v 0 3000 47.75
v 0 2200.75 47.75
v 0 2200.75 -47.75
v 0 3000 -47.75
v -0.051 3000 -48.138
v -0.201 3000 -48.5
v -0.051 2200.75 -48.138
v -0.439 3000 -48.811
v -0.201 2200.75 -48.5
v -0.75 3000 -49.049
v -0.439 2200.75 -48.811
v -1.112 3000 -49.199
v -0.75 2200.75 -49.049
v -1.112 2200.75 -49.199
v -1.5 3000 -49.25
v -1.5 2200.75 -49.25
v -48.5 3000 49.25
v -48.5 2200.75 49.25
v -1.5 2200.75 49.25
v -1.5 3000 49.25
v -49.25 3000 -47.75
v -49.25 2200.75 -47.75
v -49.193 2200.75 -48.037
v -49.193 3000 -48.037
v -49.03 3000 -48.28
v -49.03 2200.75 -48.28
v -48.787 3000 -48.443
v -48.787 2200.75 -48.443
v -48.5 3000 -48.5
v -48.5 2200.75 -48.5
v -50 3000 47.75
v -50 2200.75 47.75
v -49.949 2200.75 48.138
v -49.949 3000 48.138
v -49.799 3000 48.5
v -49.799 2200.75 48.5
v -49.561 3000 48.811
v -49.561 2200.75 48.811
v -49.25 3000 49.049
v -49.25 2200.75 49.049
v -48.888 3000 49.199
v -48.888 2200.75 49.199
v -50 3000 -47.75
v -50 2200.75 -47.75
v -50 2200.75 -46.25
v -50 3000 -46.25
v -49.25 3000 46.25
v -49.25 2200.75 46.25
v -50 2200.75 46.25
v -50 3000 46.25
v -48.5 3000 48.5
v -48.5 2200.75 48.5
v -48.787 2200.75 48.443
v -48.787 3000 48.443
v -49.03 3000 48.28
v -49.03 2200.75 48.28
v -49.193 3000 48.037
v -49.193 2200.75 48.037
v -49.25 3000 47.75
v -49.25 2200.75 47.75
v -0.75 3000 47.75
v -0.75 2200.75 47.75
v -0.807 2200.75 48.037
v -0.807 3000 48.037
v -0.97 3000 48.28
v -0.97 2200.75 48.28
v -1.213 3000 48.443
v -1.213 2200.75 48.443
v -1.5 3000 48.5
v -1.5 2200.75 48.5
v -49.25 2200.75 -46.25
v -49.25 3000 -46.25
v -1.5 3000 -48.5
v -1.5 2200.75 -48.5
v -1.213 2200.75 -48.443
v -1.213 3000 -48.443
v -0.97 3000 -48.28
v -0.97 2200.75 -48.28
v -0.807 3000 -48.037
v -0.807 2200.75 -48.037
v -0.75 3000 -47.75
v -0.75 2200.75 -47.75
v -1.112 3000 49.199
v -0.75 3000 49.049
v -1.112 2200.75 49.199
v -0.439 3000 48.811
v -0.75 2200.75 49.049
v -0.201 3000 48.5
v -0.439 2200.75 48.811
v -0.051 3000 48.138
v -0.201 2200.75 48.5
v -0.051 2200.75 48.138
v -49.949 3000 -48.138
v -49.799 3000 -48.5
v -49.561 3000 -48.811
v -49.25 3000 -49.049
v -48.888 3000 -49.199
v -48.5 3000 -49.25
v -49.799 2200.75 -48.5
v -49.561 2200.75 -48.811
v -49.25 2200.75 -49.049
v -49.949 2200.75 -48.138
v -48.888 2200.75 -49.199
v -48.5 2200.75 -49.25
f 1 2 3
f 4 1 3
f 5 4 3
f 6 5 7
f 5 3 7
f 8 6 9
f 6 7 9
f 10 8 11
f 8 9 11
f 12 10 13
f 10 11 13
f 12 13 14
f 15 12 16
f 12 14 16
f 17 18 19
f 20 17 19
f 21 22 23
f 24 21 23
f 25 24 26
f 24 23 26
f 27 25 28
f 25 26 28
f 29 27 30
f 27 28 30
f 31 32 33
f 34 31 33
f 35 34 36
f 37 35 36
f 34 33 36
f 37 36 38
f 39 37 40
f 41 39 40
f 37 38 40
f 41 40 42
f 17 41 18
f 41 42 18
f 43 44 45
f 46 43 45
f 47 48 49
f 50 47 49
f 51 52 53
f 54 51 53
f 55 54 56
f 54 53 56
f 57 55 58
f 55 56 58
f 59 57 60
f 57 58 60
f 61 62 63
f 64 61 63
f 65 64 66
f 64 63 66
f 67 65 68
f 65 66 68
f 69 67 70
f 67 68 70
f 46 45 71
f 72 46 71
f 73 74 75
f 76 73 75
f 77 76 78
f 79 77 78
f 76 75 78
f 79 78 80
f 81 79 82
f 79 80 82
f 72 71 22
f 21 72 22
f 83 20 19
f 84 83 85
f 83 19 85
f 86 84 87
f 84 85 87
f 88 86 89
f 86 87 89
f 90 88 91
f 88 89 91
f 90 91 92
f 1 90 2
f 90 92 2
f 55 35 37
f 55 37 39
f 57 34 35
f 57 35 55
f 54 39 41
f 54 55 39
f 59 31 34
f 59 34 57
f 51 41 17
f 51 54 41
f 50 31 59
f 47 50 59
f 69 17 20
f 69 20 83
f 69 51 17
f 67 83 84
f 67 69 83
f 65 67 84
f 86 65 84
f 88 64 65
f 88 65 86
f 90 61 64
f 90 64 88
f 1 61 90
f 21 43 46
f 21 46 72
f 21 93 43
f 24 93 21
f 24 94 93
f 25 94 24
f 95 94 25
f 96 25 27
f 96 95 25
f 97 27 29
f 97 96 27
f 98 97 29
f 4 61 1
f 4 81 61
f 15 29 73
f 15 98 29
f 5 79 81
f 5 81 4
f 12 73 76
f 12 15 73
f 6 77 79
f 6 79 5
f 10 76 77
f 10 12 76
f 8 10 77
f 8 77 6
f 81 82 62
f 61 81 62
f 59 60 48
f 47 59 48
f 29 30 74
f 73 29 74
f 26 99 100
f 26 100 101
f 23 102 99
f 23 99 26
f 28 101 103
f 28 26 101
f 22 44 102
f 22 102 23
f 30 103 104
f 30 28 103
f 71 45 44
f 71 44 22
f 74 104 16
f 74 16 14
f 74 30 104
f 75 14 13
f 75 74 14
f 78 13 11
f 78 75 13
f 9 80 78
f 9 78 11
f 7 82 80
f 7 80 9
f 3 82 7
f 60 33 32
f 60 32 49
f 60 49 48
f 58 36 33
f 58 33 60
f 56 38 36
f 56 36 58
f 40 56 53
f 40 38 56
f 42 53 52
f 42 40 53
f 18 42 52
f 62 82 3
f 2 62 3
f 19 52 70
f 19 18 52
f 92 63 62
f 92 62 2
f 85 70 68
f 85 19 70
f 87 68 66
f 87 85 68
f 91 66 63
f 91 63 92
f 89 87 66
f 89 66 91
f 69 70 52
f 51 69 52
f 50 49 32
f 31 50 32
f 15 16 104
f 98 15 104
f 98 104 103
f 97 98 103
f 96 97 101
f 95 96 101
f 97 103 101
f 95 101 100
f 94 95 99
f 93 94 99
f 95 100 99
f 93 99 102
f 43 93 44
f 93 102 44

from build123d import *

# Parameters (mm, degrees)
MOVE_BODY_2_DEPTH    = 3000
SKETCH_6_OUTSIDE_W   = 652.406
SKETCH_6_OUTSIDE_H   = 3602.406
SKETCH_6_OUTSIDE_W_2 = 50
SKETCH_6_OUTSIDE_H_2 = 799.25
CUT_EXTRUDE_1_DEPTH  = 3003.033019472


# Read off the part's stored shape, not the designer's step: Тело-Переместить/Копировать2
with BuildPart() as part:
    # Move Body 2 outline → Move Body 2 (new body)
    with BuildSketch(Plane(origin=(0, 0, 0), x_dir=(1, 0, 0), z_dir=(0, 1, 0))):
        with BuildLine():
            Line((-50, 47.75), (-50, 46.25))
            Line((-50, 46.25), (-49.25, 46.25))
            Line((-49.25, 46.25), (-49.25, 47.75))
            ThreePointArc((-49.25, 47.75), (-49.030330086, 48.280330086), (-48.5, 48.5))
            Line((-48.5, 48.5), (-1.5, 48.5))
            ThreePointArc((-1.5, 48.5), (-0.969669914, 48.280330086), (-0.75, 47.75))
            Line((-0.75, 47.75), (-0.75, -47.75))
            ThreePointArc((-0.75, -47.75), (-0.969669914, -48.280330086), (-1.5, -48.5))
            Line((-1.5, -48.5), (-48.5, -48.5))
            ThreePointArc((-48.5, -48.5), (-49.030330086, -48.280330086), (-49.25, -47.75))
            Line((-49.25, -47.75), (-49.25, -46.25))
            Line((-49.25, -46.25), (-50, -46.25))
            Line((-50, -46.25), (-50, -47.75))
            ThreePointArc((-50, -47.75), (-49.560660172, -48.810660172), (-48.5, -49.25))
            Line((-48.5, -49.25), (-1.5, -49.25))
            ThreePointArc((-1.5, -49.25), (-0.439339828, -48.810660172), (0, -47.75))
            Line((0, -47.75), (0, 47.75))
            ThreePointArc((0, 47.75), (-0.439339828, 48.810660172), (-1.5, 49.25))
            Line((-1.5, 49.25), (-48.5, 49.25))
            ThreePointArc((-48.5, 49.25), (-49.560660172, 48.810660172), (-50, 47.75))
        make_face()
    extrude(amount=MOVE_BODY_2_DEPTH)

    # Эскиз6 outside → Вырез-Вытянуть1 (cut, through all)
    with BuildSketch(Plane.XY.offset(49.25)):
        with Locations((-25, 1500)):
            Rectangle(SKETCH_6_OUTSIDE_W, SKETCH_6_OUTSIDE_H)
        with Locations((-25, 2600.375)):
            Rectangle(SKETCH_6_OUTSIDE_W_2, SKETCH_6_OUTSIDE_H_2, mode=Mode.SUBTRACT)
    extrude(amount=-CUT_EXTRUDE_1_DEPTH, mode=Mode.SUBTRACT)


solid = part.part
